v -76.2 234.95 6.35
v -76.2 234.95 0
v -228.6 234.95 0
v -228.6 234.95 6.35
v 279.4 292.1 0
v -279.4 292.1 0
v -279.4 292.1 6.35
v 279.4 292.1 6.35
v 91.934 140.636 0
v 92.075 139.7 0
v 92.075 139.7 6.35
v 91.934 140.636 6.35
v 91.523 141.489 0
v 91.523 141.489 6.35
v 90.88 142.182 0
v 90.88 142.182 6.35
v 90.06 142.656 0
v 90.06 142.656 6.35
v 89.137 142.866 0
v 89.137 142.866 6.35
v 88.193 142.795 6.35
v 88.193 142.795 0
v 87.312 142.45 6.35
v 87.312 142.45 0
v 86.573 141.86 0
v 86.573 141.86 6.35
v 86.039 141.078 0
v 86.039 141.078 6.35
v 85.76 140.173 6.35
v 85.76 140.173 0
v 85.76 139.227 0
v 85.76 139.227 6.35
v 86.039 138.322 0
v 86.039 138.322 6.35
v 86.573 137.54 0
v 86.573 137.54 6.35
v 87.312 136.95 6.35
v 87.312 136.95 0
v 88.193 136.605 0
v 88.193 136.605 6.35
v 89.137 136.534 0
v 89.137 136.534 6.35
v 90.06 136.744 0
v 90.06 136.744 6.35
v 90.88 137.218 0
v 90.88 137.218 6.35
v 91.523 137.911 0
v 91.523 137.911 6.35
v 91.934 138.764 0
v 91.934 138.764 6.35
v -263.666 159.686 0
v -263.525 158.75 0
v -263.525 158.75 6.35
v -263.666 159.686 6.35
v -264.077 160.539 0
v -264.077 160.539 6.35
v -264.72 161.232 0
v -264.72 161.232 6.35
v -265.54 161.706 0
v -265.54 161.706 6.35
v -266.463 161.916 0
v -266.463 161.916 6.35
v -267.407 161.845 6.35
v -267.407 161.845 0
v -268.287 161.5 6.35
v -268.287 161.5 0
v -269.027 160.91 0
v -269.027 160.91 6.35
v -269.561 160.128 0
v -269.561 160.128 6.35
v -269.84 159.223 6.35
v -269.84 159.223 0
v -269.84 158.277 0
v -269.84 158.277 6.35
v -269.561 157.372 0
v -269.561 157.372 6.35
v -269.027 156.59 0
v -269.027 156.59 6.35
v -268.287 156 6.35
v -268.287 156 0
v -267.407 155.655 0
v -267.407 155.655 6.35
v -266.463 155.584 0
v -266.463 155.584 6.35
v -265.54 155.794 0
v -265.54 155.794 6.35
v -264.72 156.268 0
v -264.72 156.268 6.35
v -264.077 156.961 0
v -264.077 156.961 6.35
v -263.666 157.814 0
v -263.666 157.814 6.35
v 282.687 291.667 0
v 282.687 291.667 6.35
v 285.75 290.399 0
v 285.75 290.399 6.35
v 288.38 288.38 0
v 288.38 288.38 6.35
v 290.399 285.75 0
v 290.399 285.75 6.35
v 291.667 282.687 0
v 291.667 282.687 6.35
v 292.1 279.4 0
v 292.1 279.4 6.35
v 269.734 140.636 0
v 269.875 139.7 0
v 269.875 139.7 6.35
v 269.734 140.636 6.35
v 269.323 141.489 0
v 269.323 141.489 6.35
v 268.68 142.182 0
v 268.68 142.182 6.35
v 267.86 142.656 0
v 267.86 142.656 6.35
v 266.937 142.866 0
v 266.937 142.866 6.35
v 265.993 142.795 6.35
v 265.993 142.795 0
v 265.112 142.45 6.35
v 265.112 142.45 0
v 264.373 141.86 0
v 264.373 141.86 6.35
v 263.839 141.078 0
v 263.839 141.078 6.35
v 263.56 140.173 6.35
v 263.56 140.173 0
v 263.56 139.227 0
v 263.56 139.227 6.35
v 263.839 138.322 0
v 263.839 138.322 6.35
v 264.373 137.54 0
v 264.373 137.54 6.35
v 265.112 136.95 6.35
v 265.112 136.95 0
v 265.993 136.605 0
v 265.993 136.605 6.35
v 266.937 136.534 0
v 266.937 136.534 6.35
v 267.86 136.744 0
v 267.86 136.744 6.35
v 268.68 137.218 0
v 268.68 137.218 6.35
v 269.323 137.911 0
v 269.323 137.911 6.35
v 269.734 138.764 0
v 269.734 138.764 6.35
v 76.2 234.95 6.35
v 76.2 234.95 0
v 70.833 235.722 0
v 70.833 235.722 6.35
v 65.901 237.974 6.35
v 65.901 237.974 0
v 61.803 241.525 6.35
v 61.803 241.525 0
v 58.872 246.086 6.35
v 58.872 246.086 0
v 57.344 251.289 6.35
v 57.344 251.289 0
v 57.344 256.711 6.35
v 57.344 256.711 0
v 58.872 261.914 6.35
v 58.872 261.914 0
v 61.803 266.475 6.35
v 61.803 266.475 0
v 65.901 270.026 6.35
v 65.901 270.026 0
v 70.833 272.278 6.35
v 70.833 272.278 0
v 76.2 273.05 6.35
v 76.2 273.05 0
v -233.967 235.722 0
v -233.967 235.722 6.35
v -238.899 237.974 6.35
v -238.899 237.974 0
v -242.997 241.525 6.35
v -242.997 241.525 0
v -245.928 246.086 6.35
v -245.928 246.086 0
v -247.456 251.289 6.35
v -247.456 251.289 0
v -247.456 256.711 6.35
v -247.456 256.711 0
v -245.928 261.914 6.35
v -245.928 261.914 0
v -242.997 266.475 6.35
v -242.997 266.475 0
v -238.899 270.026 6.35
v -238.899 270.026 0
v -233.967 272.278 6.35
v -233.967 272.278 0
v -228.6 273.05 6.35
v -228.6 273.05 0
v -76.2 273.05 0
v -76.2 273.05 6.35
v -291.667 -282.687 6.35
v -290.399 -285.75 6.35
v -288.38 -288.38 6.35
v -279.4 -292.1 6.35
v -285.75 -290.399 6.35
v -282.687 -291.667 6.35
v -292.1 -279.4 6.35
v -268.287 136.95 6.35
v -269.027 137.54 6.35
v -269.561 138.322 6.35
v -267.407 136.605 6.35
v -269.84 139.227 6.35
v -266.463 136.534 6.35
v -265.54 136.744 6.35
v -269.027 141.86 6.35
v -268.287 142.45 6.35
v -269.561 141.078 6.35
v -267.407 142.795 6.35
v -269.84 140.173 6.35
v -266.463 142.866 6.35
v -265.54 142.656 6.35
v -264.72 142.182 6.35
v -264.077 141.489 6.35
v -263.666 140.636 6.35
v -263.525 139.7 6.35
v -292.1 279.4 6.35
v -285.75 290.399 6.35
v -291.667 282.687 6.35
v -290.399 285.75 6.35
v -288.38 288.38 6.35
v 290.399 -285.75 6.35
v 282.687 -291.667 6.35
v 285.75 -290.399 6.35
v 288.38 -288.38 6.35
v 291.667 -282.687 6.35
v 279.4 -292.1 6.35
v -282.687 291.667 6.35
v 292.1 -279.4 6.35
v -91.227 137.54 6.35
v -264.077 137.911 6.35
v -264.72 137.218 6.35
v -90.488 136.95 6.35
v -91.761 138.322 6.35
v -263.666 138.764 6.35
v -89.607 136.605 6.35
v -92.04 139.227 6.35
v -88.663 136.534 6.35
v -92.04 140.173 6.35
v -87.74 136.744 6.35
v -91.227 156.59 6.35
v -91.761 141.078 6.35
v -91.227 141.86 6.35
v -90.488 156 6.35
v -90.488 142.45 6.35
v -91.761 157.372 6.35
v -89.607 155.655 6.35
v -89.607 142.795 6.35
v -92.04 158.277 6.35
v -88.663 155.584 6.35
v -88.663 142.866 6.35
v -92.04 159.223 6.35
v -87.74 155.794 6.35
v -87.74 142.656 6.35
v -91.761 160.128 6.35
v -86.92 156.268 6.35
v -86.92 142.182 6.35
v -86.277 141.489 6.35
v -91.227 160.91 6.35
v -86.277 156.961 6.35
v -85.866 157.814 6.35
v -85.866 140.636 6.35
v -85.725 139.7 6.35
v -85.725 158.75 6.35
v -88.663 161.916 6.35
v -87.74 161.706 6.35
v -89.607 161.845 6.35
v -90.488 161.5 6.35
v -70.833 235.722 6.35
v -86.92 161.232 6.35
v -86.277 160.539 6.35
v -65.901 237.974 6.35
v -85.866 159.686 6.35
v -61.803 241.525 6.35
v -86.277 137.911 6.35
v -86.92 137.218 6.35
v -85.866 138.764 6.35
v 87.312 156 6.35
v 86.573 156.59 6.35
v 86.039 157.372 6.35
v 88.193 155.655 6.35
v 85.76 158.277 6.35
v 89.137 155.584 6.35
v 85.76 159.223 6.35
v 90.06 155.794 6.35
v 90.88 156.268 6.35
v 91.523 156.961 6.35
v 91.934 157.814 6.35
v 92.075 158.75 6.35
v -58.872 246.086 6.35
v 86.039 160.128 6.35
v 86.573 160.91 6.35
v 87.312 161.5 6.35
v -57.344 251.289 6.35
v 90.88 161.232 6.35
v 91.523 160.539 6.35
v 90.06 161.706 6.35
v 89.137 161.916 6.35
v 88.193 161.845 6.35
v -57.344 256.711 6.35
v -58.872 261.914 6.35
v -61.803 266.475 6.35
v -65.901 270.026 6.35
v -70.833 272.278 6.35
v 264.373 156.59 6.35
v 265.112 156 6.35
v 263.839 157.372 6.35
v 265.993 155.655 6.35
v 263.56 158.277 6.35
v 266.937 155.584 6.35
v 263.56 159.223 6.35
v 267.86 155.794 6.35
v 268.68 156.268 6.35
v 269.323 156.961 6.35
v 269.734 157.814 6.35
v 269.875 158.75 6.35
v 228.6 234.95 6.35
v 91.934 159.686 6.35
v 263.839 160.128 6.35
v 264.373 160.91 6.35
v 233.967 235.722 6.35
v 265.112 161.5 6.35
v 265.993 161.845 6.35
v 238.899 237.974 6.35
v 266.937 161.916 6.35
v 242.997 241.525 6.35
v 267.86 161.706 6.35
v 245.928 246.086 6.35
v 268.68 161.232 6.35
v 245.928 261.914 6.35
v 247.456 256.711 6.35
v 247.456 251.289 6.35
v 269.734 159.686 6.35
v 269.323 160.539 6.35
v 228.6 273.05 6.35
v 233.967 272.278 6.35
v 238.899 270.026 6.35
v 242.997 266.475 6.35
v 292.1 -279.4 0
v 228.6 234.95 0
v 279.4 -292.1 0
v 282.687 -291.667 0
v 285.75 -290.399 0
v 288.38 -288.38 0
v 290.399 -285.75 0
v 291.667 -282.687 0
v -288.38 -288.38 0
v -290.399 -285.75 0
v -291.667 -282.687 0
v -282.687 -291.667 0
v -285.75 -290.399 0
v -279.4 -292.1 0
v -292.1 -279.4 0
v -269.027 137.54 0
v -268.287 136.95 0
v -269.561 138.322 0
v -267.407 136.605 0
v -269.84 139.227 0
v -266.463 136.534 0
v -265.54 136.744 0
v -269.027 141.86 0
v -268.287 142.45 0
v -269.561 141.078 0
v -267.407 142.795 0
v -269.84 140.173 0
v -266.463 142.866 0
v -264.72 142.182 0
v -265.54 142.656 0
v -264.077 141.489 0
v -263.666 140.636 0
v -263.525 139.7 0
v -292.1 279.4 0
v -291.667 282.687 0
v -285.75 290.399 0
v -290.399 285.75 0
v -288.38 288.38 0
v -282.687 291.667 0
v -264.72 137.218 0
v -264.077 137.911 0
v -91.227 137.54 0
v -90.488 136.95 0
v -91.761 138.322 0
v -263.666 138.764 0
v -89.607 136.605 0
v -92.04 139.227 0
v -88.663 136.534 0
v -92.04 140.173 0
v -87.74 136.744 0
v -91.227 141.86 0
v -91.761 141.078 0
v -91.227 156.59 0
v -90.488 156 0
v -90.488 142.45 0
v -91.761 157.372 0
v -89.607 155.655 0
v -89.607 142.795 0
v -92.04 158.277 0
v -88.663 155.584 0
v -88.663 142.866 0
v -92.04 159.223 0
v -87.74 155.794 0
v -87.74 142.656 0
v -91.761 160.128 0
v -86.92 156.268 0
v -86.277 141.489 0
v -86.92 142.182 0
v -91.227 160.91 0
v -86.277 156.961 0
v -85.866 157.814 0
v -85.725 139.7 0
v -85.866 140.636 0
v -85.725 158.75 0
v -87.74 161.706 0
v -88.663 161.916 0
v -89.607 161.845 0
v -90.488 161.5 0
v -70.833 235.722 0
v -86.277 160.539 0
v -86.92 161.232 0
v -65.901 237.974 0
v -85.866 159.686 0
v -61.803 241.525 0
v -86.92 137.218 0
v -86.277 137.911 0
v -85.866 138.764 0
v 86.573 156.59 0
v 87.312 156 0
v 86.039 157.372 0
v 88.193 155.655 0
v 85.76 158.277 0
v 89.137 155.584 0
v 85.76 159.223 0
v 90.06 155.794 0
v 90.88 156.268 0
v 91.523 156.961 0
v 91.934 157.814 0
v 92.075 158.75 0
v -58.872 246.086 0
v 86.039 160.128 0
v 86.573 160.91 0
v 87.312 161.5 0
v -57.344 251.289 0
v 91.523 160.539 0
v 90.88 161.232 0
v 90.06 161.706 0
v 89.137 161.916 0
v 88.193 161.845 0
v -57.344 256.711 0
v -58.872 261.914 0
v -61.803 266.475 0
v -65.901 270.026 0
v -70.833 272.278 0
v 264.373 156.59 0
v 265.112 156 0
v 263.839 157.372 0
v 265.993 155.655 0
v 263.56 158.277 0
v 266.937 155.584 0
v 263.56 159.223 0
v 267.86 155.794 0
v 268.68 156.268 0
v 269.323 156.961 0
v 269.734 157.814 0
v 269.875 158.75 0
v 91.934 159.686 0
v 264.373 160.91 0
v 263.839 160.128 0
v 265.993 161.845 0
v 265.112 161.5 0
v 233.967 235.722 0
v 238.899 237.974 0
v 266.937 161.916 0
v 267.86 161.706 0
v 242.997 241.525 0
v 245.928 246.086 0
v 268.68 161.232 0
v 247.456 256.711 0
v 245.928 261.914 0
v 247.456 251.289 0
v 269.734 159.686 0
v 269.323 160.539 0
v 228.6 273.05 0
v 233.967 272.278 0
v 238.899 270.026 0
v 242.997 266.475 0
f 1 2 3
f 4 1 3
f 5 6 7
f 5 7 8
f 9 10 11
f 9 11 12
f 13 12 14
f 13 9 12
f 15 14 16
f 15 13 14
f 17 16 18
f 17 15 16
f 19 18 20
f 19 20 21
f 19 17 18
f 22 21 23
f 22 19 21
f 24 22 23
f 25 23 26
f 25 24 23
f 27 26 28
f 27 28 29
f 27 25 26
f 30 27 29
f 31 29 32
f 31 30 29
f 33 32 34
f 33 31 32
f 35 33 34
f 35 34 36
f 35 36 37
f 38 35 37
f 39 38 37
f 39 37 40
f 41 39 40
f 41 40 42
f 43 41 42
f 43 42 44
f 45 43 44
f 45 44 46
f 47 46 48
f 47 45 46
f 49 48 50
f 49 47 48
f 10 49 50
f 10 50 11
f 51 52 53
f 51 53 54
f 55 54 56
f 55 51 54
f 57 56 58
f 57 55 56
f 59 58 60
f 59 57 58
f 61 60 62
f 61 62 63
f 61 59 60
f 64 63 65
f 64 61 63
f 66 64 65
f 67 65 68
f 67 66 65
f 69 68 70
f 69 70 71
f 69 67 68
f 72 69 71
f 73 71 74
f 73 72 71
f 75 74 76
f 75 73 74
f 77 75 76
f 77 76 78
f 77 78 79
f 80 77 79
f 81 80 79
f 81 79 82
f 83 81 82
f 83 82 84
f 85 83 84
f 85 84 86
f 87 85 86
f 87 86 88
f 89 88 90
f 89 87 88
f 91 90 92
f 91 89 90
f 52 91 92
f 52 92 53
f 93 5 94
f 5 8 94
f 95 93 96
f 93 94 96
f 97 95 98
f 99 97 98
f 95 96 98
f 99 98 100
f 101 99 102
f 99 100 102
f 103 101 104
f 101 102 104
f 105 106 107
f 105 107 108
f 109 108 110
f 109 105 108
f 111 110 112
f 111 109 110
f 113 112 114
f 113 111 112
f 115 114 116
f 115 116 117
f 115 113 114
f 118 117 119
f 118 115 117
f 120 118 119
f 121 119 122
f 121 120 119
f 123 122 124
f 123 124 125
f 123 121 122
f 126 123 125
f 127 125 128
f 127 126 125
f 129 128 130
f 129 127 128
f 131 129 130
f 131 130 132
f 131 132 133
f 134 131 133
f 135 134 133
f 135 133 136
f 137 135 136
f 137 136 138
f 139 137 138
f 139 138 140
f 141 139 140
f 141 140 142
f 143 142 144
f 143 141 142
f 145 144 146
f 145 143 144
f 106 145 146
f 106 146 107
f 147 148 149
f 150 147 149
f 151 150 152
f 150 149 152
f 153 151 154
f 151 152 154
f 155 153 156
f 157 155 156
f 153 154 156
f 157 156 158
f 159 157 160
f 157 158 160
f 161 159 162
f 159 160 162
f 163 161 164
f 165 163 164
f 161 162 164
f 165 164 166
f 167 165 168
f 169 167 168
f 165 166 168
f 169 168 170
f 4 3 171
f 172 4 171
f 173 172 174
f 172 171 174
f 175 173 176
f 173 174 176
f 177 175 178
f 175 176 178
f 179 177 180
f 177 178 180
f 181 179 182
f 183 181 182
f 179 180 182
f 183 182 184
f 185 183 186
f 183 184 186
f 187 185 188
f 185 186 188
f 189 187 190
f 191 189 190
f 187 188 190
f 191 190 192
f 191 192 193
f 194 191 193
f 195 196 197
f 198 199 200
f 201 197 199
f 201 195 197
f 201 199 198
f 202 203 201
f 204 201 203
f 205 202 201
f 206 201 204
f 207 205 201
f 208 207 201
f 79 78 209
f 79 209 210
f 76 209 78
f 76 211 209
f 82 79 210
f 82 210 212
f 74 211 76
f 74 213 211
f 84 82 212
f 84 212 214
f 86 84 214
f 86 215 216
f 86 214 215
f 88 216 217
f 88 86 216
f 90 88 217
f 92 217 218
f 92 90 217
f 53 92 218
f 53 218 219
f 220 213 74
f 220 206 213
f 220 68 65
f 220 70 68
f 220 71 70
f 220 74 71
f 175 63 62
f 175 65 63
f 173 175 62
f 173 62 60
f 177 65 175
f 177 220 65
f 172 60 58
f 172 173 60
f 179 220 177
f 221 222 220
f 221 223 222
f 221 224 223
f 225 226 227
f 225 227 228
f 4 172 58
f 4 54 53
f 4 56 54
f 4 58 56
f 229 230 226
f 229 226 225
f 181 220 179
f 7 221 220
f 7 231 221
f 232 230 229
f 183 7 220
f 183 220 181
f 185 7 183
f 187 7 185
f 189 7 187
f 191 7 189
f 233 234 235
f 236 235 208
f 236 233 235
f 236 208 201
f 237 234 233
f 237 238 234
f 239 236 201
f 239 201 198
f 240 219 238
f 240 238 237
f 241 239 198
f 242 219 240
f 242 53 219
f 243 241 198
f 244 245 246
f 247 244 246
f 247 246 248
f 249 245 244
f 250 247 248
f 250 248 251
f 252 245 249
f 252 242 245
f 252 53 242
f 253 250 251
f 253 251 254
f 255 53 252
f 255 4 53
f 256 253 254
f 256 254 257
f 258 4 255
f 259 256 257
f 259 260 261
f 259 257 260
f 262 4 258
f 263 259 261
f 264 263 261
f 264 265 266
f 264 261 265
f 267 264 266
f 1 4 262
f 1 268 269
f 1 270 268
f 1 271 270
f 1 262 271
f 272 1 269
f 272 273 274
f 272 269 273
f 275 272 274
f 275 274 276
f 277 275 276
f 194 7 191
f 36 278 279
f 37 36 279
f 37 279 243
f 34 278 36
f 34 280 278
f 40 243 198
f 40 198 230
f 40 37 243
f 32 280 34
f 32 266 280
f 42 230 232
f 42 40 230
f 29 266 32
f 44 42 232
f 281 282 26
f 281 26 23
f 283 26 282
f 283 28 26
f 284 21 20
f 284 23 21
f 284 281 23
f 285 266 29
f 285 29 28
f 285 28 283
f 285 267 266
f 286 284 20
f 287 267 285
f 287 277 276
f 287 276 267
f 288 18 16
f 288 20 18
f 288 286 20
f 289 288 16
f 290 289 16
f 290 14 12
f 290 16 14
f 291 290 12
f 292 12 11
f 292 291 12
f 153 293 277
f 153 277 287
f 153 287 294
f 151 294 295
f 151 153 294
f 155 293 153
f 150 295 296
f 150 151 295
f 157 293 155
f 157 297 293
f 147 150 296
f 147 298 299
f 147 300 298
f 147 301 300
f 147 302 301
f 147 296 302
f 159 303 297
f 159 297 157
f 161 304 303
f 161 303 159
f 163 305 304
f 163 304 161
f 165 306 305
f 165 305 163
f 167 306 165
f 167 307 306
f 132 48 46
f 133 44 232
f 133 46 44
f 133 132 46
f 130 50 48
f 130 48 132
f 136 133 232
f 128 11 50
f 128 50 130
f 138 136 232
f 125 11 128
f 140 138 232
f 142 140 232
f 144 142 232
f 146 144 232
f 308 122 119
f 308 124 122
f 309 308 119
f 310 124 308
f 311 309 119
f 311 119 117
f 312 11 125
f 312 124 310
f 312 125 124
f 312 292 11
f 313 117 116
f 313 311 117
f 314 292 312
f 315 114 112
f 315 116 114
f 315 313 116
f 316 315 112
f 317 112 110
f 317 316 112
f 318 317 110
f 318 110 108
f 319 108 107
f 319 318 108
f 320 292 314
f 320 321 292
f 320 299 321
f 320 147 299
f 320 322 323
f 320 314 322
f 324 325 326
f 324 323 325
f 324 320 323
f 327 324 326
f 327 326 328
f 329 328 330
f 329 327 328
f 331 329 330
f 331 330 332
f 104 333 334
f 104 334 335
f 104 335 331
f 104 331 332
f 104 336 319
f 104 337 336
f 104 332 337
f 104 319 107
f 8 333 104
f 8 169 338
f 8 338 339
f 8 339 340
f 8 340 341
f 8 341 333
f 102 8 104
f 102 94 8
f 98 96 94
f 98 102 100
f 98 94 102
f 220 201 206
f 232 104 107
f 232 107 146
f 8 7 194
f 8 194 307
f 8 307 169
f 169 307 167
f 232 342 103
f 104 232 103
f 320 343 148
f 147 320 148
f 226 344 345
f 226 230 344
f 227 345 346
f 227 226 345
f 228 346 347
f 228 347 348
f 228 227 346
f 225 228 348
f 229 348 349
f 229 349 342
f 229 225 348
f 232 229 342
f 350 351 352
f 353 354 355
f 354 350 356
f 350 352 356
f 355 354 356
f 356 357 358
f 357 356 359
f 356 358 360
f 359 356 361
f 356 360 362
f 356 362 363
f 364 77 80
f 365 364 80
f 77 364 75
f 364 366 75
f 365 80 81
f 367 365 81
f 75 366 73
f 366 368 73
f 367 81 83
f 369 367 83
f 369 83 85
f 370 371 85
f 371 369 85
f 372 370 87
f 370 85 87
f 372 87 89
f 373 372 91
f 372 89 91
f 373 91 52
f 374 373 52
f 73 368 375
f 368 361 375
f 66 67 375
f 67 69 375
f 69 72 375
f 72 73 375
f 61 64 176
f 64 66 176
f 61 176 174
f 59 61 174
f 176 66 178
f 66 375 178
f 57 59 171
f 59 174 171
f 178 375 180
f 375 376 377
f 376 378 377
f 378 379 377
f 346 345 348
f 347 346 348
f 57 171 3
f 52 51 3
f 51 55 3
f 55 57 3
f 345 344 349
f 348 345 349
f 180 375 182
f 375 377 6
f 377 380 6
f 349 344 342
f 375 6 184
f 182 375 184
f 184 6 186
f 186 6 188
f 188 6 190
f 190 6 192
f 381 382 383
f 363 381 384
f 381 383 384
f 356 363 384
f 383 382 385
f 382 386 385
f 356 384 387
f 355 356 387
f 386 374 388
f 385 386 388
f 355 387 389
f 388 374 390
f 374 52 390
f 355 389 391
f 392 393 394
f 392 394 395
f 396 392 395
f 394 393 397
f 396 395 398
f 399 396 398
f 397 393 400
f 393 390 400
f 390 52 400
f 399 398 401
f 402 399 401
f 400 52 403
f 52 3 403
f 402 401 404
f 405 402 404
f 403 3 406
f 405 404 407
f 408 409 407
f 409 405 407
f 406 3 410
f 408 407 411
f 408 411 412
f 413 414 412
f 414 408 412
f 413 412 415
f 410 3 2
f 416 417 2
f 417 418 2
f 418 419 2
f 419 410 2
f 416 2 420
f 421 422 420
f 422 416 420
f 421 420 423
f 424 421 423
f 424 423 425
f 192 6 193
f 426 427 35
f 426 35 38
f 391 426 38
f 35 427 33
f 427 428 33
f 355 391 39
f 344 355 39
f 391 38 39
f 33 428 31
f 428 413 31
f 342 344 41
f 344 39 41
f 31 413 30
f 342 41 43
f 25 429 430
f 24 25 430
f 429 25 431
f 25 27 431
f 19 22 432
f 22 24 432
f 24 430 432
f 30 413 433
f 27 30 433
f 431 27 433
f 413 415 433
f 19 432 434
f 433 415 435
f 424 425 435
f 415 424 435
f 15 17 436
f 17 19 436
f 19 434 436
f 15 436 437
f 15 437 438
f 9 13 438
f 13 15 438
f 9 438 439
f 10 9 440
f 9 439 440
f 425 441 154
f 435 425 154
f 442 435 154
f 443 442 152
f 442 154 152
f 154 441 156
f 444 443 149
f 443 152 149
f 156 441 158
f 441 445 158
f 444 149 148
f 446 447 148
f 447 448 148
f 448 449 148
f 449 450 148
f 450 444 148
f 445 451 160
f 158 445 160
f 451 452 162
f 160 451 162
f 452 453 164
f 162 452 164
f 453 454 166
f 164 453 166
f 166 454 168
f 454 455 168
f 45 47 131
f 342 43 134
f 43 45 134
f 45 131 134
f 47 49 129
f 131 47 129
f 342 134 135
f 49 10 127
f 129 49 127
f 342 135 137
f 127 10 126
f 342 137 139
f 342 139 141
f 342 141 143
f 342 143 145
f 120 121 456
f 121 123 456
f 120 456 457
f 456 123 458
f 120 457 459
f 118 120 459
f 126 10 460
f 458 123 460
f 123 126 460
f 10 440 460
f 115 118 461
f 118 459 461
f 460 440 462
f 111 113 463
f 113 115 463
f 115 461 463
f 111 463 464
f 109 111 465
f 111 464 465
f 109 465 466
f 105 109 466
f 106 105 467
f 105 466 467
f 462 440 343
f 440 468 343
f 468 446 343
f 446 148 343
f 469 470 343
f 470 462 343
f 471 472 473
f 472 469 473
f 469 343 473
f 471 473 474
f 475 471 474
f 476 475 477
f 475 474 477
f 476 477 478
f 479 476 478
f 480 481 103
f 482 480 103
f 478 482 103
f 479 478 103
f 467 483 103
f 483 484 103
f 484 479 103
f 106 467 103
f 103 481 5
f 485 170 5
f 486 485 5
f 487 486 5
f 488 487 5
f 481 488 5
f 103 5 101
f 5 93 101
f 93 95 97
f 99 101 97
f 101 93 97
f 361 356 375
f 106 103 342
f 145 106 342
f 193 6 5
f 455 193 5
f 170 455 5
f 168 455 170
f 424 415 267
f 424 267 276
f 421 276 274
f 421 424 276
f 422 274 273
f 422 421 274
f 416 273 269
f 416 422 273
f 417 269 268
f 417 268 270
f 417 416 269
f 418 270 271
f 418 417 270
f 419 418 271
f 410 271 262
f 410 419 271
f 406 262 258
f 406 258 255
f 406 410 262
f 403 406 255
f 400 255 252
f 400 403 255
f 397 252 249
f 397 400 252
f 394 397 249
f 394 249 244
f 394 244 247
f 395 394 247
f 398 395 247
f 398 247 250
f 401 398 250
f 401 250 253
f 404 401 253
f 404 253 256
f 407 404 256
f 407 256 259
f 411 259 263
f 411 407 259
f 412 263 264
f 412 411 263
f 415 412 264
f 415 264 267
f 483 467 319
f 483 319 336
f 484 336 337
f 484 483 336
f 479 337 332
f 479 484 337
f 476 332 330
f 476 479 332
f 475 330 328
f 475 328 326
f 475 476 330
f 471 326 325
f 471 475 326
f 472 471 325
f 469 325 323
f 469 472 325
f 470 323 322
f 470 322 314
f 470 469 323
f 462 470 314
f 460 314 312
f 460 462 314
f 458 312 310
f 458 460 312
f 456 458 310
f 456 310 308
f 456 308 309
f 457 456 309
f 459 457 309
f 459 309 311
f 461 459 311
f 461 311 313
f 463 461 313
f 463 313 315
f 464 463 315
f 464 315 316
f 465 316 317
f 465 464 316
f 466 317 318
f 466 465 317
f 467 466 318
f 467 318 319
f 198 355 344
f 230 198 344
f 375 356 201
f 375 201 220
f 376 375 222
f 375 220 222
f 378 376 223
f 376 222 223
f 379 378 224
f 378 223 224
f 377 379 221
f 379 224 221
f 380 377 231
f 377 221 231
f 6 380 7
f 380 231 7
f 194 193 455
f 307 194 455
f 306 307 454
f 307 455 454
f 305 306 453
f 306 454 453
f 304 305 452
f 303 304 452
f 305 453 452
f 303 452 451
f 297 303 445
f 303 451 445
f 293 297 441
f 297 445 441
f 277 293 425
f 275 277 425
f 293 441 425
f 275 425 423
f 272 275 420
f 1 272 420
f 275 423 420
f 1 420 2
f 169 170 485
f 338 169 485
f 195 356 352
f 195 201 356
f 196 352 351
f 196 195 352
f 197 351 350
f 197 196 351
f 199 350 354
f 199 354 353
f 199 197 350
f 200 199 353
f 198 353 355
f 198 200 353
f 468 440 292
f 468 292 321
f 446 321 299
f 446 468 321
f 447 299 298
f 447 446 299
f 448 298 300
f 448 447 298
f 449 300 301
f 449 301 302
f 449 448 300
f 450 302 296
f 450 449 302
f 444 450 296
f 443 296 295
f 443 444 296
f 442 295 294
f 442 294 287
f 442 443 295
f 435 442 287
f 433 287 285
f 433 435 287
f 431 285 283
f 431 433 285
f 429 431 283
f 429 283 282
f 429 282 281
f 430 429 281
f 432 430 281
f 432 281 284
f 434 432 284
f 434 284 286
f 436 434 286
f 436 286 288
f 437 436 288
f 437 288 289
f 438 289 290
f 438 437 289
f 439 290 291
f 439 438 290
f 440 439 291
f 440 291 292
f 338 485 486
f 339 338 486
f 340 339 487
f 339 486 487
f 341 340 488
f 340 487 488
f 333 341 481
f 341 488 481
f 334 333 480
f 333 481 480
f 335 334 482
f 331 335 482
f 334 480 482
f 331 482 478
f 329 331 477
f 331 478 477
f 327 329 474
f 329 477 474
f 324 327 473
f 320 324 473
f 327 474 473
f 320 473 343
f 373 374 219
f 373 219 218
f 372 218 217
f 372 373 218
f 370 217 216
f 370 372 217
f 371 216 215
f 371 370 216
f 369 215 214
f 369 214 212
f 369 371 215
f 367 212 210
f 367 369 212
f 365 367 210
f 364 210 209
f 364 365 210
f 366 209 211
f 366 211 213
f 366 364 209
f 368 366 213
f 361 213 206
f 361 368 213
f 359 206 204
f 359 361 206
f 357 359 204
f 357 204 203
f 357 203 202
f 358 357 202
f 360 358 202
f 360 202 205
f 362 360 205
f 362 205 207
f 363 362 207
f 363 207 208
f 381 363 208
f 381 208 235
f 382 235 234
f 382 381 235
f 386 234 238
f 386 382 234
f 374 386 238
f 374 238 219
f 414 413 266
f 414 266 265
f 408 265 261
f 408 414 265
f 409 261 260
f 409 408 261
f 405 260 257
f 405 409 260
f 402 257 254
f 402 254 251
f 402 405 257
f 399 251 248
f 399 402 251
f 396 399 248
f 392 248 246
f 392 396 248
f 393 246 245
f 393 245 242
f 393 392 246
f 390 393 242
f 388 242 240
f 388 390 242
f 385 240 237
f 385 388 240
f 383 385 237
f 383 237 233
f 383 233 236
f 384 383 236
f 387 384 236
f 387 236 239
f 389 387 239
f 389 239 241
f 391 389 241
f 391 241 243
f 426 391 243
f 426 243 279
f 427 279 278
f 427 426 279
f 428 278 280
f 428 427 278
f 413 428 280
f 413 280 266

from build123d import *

# Parameters (mm, degrees)
SKETCH1_W           = 584.2
SKETCH1_H           = 584.2
SKETCH1_R           = 3.175
BOSS_EXTRUDE1_DEPTH = 6.35
FILLET1_R           = 12.7


with BuildPart() as part:
    # Sketch1 → Boss-Extrude1 (new body)
    with BuildSketch(Plane.XY):
        Rectangle(SKETCH1_W, SKETCH1_H)
        with Locations((-266.7, 139.7)):
            Circle(SKETCH1_R, mode=Mode.SUBTRACT)
        with Locations((-88.9, 139.7)):
            Circle(SKETCH1_R, mode=Mode.SUBTRACT)
        with Locations((88.9, 139.7)):
            Circle(SKETCH1_R, mode=Mode.SUBTRACT)
        with Locations((266.7, 139.7)):
            Circle(SKETCH1_R, mode=Mode.SUBTRACT)
        with Locations((-88.9, 158.75)):
            Circle(SKETCH1_R, mode=Mode.SUBTRACT)
        with Locations((88.9, 158.75)):
            Circle(SKETCH1_R, mode=Mode.SUBTRACT)
        with Locations((266.7, 158.75)):
            Circle(SKETCH1_R, mode=Mode.SUBTRACT)
        with Locations((-266.7, 158.75)):
            Circle(SKETCH1_R, mode=Mode.SUBTRACT)
        with BuildLine():
            Line((-228.6, 273.05), (-76.2, 273.05))
            ThreePointArc((-76.2, 273.05), (-57.15, 254), (-76.2, 234.95))
            Line((-76.2, 234.95), (-228.6, 234.95))
            ThreePointArc((-228.6, 234.95), (-247.65, 254), (-228.6, 273.05))
        make_face(mode=Mode.SUBTRACT)
        with BuildLine():
            Line((76.2, 273.05), (228.6, 273.05))
            ThreePointArc((228.6, 273.05), (247.65, 254), (228.6, 234.95))
            Line((228.6, 234.95), (76.2, 234.95))
            ThreePointArc((76.2, 234.95), (57.15, 254), (76.2, 273.05))
        make_face(mode=Mode.SUBTRACT)
    extrude(amount=BOSS_EXTRUDE1_DEPTH)

    # Fillet1
    fillet1_edges = [part.edges().sort_by_distance(p)[0] for p in [
        (292.1, -292.1, 3.175),
        (-292.1, -292.1, 3.175),
        (-292.1, 292.1, 3.175),
        (292.1, 292.1, 3.175),
    ]]
    fillet(fillet1_edges, radius=FILLET1_R)


solid = part.part
